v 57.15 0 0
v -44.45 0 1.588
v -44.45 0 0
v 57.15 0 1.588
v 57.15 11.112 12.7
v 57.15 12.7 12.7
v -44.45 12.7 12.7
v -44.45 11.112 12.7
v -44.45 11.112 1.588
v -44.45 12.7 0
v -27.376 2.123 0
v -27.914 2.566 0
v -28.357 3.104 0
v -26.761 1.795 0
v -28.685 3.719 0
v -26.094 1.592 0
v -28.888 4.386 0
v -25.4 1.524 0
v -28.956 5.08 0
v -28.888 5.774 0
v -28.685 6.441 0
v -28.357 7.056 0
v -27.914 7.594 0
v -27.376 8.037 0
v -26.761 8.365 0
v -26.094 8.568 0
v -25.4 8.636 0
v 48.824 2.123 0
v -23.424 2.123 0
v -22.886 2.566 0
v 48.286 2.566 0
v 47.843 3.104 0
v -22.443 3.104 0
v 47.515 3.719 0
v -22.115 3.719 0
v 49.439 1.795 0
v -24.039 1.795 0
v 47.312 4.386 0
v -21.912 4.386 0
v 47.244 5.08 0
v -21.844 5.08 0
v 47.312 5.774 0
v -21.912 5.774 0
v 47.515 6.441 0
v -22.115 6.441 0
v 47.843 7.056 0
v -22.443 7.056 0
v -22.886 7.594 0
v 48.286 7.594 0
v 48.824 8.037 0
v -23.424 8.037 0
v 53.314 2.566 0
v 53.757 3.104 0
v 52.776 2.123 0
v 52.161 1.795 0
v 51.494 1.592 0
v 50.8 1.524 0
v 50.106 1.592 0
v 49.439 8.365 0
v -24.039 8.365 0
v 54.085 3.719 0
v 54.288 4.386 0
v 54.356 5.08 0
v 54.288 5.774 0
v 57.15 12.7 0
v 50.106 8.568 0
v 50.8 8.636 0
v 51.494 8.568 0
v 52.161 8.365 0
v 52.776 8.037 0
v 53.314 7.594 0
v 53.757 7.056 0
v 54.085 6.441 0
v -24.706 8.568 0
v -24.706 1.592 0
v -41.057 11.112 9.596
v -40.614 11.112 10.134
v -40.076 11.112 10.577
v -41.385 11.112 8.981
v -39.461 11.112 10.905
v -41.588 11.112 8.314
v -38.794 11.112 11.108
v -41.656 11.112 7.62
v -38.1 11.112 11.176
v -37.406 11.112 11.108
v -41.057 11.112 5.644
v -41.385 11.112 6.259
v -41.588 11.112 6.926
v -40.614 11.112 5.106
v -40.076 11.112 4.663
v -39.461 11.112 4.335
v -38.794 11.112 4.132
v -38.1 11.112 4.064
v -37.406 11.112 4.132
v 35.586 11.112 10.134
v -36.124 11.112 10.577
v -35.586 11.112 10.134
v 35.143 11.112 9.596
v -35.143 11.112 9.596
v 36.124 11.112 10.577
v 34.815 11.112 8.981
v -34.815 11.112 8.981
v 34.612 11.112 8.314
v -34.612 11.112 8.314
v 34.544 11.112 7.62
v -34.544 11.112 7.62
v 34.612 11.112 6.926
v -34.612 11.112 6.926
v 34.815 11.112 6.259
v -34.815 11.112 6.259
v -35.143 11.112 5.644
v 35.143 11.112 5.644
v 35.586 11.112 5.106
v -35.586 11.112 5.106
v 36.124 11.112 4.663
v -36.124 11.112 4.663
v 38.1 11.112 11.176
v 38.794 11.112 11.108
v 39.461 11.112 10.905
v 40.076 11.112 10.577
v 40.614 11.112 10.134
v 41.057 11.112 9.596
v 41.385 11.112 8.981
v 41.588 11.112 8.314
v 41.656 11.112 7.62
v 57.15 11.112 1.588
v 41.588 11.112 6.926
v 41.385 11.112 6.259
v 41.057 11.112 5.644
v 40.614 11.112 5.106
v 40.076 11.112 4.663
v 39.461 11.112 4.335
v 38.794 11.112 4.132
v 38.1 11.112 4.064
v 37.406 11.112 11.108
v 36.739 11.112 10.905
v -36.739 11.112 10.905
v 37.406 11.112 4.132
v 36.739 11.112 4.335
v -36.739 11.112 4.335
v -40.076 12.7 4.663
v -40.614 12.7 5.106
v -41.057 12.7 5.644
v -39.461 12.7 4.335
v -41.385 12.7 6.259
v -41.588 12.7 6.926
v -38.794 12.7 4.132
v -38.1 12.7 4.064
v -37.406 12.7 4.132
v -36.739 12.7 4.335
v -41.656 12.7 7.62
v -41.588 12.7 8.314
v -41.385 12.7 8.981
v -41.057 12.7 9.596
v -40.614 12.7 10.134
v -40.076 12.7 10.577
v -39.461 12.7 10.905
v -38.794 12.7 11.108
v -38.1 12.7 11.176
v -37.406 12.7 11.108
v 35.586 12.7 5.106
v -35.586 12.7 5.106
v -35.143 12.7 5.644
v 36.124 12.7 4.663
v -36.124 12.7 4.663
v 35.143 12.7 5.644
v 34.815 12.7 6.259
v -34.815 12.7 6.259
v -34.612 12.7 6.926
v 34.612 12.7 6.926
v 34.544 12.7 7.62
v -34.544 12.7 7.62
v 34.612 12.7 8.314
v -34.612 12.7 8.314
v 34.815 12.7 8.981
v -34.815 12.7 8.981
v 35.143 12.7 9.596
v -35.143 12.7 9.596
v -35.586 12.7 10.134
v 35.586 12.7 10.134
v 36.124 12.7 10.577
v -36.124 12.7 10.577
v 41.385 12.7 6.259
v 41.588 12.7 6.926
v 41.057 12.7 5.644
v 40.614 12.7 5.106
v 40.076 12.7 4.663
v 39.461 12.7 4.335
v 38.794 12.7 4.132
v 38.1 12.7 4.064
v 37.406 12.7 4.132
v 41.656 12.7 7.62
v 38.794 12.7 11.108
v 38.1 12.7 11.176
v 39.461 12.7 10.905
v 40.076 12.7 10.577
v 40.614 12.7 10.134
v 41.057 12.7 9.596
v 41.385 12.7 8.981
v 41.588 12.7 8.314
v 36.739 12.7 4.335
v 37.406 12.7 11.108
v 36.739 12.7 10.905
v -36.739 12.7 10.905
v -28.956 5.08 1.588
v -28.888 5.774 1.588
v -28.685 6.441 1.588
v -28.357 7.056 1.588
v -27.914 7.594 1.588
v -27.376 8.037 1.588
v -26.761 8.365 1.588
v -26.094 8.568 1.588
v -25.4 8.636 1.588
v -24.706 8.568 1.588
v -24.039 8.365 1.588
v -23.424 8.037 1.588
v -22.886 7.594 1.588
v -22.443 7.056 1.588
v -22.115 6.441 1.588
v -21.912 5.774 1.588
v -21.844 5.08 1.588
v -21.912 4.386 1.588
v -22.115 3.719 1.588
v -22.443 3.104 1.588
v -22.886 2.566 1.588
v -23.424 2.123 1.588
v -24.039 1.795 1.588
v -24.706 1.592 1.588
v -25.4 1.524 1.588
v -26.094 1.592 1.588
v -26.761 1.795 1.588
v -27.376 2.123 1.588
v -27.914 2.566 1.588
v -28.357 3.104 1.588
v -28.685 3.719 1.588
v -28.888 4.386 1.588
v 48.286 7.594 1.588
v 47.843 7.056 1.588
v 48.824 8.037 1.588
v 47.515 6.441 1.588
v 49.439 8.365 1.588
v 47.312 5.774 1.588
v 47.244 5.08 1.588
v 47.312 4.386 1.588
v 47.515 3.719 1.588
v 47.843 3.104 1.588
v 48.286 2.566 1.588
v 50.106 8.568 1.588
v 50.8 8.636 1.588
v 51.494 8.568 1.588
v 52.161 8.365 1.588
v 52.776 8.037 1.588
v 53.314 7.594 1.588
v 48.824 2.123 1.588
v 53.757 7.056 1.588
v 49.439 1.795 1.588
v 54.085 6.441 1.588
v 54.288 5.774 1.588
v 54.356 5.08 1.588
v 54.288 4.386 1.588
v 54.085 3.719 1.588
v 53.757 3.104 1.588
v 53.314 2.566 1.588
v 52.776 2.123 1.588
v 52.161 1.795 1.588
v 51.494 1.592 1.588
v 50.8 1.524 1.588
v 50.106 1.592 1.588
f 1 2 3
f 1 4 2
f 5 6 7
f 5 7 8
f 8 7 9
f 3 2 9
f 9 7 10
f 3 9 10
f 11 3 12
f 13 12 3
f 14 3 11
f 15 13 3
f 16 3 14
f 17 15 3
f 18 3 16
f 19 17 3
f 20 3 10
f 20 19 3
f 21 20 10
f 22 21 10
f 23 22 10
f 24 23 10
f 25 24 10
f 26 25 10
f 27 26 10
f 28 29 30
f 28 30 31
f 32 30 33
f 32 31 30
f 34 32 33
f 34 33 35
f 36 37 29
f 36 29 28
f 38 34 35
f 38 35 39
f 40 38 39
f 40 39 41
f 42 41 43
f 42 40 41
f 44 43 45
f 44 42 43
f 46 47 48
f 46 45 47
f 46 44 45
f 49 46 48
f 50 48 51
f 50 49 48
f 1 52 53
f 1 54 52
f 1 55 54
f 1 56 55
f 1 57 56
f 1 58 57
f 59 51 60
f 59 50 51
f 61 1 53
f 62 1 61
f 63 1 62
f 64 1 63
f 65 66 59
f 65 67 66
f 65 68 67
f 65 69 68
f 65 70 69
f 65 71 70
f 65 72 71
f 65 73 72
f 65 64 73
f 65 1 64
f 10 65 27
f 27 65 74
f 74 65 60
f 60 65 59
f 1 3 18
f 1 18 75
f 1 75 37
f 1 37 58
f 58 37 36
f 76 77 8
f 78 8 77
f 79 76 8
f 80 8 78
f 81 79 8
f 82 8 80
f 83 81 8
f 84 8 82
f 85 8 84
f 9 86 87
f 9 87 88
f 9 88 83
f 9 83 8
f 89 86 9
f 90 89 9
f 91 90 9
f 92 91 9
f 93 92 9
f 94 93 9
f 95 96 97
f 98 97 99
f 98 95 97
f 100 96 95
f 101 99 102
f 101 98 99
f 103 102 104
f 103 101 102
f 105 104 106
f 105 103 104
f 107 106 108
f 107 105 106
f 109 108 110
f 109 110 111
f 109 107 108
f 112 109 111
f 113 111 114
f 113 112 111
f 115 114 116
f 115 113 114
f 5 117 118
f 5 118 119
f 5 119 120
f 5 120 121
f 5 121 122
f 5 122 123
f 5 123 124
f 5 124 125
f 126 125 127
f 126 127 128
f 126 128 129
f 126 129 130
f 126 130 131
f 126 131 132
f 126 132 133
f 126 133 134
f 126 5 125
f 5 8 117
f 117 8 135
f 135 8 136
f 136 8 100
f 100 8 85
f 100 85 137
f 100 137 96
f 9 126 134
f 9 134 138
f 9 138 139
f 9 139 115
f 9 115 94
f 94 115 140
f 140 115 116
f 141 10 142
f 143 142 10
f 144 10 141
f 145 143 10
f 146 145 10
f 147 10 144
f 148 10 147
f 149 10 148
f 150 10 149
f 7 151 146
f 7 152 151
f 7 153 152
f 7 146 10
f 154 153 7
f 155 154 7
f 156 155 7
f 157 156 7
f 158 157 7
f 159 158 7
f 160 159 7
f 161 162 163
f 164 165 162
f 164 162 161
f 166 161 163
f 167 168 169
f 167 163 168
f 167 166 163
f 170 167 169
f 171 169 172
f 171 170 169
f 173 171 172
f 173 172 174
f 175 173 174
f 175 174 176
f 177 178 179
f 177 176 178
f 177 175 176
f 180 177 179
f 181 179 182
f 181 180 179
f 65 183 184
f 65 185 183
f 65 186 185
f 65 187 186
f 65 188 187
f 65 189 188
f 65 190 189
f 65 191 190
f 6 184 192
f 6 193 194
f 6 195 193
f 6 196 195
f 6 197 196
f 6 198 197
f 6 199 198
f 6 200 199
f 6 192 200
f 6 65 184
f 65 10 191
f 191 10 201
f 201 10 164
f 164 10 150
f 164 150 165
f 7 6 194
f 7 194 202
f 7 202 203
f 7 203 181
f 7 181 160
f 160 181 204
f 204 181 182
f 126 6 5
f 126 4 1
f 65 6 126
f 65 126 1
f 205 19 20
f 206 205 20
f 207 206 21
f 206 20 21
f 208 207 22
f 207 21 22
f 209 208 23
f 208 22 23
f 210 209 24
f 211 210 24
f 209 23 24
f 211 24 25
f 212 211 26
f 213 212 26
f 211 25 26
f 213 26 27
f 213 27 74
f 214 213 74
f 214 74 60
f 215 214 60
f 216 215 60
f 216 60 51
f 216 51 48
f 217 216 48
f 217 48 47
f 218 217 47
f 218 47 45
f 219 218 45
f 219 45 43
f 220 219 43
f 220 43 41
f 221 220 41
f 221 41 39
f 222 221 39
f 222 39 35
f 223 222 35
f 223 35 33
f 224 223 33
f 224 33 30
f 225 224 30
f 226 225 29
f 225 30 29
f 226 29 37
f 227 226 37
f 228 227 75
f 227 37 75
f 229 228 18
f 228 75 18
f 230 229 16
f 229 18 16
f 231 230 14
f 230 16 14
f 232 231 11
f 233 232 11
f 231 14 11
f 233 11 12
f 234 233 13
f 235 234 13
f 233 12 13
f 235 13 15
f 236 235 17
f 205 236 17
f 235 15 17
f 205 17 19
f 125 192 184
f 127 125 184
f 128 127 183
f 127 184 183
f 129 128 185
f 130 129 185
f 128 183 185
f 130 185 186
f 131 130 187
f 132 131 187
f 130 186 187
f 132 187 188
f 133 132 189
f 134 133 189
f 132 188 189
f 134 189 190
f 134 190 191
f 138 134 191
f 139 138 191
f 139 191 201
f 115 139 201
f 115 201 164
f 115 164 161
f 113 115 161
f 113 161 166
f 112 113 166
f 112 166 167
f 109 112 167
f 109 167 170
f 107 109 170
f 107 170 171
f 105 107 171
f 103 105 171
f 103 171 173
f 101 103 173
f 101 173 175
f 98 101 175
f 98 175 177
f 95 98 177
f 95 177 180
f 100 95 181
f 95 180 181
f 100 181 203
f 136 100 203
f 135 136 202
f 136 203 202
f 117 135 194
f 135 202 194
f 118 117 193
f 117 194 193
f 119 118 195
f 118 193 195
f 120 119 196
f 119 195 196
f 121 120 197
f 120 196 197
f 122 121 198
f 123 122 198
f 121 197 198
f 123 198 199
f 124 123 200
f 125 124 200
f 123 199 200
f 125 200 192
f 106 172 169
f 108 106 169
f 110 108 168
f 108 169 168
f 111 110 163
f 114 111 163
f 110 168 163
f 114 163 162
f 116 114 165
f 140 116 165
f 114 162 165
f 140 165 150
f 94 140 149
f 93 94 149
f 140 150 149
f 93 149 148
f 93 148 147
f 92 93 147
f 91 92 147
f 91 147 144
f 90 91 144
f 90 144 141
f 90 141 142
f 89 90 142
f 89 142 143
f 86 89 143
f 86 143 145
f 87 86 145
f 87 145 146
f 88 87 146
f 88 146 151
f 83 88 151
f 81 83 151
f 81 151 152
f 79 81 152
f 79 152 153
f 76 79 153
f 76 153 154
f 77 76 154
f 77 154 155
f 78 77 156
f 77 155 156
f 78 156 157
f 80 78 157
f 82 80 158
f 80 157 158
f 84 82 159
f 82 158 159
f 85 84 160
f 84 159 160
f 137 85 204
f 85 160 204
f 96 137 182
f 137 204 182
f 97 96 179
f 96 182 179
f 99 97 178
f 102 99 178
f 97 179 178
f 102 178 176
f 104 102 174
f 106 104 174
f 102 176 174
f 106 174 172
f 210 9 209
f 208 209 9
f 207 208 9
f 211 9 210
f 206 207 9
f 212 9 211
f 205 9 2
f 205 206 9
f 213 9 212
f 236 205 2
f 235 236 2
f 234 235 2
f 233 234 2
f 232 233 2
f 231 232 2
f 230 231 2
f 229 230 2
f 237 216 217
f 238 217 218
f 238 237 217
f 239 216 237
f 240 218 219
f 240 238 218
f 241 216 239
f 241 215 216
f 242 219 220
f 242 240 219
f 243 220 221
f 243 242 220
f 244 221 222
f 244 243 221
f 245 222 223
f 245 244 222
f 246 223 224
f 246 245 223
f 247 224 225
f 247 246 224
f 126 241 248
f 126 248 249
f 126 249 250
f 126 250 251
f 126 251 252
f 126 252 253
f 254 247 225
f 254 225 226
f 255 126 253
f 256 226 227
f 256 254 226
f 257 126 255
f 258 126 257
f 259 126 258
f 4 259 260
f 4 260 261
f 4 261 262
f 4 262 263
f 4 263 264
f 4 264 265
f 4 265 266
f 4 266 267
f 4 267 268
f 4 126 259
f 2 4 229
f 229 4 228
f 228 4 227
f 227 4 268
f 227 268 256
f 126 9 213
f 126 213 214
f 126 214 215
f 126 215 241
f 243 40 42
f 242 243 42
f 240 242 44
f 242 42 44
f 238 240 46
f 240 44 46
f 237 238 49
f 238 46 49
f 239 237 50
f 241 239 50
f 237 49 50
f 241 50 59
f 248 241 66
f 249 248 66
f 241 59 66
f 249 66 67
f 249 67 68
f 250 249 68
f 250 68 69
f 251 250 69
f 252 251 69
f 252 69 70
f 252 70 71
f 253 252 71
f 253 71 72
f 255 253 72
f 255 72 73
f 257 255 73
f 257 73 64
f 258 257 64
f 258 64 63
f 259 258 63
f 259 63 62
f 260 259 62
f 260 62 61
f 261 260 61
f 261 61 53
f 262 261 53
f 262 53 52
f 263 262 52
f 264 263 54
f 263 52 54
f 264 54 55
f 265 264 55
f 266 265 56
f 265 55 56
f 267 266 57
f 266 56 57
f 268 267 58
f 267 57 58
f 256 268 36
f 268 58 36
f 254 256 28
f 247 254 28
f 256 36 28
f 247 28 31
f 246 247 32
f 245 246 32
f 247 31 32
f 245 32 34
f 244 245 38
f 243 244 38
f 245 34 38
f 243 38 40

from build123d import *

# Parameters (mm, degrees)
BOSS_EXTRUDE1_DEPTH      = 57.15
BOSS_EXTRUDE1_DEPTH_BACK = 44.45
SKETCH3_R                = 3.556
CUT_EXTRUDE1_DEPTH       = 13.7
SKETCH4_R                = 3.556
CUT_EXTRUDE2_DEPTH       = 13.7


with BuildPart() as part:
    # Sketch1 → Boss-Extrude1 (new body, two sides)
    with BuildSketch(Plane(origin=(0, 0, 0), x_dir=(0, 0, -1), z_dir=(1, 0, 0))) as boss_extrude1_sk:
        Polygon((0, 0), (0, 12.7), (-12.7, 12.7), (-12.7, 11.1125), (-1.5875, 11.1125), (-1.5875, 0), align=None)
    extrude(amount=BOSS_EXTRUDE1_DEPTH)
    extrude(boss_extrude1_sk.sketch, amount=-BOSS_EXTRUDE1_DEPTH_BACK)

    # Sketch3 → Cut-Extrude1 (cut, through all)
    with BuildSketch(Plane(origin=(0, 0, 0), x_dir=(-1, 0, 0), z_dir=(0, 0, -1))):
        with Locations((25.4, 5.08)):
            Circle(SKETCH3_R)
        with Locations((-50.8, 5.08)):
            Circle(SKETCH3_R)
    extrude(amount=-CUT_EXTRUDE1_DEPTH, mode=Mode.SUBTRACT)

    # Sketch4 → Cut-Extrude2 (cut, through all)
    with BuildSketch(Plane(origin=(0, 12.7, 0), x_dir=(1, 0, 0), z_dir=(0, 1, 0))):
        with Locations((-38.1, -7.62)):
            Circle(SKETCH4_R)
        with Locations((38.1, -7.62)):
            Circle(SKETCH4_R)
    extrude(amount=-CUT_EXTRUDE2_DEPTH, mode=Mode.SUBTRACT)


solid = part.part
